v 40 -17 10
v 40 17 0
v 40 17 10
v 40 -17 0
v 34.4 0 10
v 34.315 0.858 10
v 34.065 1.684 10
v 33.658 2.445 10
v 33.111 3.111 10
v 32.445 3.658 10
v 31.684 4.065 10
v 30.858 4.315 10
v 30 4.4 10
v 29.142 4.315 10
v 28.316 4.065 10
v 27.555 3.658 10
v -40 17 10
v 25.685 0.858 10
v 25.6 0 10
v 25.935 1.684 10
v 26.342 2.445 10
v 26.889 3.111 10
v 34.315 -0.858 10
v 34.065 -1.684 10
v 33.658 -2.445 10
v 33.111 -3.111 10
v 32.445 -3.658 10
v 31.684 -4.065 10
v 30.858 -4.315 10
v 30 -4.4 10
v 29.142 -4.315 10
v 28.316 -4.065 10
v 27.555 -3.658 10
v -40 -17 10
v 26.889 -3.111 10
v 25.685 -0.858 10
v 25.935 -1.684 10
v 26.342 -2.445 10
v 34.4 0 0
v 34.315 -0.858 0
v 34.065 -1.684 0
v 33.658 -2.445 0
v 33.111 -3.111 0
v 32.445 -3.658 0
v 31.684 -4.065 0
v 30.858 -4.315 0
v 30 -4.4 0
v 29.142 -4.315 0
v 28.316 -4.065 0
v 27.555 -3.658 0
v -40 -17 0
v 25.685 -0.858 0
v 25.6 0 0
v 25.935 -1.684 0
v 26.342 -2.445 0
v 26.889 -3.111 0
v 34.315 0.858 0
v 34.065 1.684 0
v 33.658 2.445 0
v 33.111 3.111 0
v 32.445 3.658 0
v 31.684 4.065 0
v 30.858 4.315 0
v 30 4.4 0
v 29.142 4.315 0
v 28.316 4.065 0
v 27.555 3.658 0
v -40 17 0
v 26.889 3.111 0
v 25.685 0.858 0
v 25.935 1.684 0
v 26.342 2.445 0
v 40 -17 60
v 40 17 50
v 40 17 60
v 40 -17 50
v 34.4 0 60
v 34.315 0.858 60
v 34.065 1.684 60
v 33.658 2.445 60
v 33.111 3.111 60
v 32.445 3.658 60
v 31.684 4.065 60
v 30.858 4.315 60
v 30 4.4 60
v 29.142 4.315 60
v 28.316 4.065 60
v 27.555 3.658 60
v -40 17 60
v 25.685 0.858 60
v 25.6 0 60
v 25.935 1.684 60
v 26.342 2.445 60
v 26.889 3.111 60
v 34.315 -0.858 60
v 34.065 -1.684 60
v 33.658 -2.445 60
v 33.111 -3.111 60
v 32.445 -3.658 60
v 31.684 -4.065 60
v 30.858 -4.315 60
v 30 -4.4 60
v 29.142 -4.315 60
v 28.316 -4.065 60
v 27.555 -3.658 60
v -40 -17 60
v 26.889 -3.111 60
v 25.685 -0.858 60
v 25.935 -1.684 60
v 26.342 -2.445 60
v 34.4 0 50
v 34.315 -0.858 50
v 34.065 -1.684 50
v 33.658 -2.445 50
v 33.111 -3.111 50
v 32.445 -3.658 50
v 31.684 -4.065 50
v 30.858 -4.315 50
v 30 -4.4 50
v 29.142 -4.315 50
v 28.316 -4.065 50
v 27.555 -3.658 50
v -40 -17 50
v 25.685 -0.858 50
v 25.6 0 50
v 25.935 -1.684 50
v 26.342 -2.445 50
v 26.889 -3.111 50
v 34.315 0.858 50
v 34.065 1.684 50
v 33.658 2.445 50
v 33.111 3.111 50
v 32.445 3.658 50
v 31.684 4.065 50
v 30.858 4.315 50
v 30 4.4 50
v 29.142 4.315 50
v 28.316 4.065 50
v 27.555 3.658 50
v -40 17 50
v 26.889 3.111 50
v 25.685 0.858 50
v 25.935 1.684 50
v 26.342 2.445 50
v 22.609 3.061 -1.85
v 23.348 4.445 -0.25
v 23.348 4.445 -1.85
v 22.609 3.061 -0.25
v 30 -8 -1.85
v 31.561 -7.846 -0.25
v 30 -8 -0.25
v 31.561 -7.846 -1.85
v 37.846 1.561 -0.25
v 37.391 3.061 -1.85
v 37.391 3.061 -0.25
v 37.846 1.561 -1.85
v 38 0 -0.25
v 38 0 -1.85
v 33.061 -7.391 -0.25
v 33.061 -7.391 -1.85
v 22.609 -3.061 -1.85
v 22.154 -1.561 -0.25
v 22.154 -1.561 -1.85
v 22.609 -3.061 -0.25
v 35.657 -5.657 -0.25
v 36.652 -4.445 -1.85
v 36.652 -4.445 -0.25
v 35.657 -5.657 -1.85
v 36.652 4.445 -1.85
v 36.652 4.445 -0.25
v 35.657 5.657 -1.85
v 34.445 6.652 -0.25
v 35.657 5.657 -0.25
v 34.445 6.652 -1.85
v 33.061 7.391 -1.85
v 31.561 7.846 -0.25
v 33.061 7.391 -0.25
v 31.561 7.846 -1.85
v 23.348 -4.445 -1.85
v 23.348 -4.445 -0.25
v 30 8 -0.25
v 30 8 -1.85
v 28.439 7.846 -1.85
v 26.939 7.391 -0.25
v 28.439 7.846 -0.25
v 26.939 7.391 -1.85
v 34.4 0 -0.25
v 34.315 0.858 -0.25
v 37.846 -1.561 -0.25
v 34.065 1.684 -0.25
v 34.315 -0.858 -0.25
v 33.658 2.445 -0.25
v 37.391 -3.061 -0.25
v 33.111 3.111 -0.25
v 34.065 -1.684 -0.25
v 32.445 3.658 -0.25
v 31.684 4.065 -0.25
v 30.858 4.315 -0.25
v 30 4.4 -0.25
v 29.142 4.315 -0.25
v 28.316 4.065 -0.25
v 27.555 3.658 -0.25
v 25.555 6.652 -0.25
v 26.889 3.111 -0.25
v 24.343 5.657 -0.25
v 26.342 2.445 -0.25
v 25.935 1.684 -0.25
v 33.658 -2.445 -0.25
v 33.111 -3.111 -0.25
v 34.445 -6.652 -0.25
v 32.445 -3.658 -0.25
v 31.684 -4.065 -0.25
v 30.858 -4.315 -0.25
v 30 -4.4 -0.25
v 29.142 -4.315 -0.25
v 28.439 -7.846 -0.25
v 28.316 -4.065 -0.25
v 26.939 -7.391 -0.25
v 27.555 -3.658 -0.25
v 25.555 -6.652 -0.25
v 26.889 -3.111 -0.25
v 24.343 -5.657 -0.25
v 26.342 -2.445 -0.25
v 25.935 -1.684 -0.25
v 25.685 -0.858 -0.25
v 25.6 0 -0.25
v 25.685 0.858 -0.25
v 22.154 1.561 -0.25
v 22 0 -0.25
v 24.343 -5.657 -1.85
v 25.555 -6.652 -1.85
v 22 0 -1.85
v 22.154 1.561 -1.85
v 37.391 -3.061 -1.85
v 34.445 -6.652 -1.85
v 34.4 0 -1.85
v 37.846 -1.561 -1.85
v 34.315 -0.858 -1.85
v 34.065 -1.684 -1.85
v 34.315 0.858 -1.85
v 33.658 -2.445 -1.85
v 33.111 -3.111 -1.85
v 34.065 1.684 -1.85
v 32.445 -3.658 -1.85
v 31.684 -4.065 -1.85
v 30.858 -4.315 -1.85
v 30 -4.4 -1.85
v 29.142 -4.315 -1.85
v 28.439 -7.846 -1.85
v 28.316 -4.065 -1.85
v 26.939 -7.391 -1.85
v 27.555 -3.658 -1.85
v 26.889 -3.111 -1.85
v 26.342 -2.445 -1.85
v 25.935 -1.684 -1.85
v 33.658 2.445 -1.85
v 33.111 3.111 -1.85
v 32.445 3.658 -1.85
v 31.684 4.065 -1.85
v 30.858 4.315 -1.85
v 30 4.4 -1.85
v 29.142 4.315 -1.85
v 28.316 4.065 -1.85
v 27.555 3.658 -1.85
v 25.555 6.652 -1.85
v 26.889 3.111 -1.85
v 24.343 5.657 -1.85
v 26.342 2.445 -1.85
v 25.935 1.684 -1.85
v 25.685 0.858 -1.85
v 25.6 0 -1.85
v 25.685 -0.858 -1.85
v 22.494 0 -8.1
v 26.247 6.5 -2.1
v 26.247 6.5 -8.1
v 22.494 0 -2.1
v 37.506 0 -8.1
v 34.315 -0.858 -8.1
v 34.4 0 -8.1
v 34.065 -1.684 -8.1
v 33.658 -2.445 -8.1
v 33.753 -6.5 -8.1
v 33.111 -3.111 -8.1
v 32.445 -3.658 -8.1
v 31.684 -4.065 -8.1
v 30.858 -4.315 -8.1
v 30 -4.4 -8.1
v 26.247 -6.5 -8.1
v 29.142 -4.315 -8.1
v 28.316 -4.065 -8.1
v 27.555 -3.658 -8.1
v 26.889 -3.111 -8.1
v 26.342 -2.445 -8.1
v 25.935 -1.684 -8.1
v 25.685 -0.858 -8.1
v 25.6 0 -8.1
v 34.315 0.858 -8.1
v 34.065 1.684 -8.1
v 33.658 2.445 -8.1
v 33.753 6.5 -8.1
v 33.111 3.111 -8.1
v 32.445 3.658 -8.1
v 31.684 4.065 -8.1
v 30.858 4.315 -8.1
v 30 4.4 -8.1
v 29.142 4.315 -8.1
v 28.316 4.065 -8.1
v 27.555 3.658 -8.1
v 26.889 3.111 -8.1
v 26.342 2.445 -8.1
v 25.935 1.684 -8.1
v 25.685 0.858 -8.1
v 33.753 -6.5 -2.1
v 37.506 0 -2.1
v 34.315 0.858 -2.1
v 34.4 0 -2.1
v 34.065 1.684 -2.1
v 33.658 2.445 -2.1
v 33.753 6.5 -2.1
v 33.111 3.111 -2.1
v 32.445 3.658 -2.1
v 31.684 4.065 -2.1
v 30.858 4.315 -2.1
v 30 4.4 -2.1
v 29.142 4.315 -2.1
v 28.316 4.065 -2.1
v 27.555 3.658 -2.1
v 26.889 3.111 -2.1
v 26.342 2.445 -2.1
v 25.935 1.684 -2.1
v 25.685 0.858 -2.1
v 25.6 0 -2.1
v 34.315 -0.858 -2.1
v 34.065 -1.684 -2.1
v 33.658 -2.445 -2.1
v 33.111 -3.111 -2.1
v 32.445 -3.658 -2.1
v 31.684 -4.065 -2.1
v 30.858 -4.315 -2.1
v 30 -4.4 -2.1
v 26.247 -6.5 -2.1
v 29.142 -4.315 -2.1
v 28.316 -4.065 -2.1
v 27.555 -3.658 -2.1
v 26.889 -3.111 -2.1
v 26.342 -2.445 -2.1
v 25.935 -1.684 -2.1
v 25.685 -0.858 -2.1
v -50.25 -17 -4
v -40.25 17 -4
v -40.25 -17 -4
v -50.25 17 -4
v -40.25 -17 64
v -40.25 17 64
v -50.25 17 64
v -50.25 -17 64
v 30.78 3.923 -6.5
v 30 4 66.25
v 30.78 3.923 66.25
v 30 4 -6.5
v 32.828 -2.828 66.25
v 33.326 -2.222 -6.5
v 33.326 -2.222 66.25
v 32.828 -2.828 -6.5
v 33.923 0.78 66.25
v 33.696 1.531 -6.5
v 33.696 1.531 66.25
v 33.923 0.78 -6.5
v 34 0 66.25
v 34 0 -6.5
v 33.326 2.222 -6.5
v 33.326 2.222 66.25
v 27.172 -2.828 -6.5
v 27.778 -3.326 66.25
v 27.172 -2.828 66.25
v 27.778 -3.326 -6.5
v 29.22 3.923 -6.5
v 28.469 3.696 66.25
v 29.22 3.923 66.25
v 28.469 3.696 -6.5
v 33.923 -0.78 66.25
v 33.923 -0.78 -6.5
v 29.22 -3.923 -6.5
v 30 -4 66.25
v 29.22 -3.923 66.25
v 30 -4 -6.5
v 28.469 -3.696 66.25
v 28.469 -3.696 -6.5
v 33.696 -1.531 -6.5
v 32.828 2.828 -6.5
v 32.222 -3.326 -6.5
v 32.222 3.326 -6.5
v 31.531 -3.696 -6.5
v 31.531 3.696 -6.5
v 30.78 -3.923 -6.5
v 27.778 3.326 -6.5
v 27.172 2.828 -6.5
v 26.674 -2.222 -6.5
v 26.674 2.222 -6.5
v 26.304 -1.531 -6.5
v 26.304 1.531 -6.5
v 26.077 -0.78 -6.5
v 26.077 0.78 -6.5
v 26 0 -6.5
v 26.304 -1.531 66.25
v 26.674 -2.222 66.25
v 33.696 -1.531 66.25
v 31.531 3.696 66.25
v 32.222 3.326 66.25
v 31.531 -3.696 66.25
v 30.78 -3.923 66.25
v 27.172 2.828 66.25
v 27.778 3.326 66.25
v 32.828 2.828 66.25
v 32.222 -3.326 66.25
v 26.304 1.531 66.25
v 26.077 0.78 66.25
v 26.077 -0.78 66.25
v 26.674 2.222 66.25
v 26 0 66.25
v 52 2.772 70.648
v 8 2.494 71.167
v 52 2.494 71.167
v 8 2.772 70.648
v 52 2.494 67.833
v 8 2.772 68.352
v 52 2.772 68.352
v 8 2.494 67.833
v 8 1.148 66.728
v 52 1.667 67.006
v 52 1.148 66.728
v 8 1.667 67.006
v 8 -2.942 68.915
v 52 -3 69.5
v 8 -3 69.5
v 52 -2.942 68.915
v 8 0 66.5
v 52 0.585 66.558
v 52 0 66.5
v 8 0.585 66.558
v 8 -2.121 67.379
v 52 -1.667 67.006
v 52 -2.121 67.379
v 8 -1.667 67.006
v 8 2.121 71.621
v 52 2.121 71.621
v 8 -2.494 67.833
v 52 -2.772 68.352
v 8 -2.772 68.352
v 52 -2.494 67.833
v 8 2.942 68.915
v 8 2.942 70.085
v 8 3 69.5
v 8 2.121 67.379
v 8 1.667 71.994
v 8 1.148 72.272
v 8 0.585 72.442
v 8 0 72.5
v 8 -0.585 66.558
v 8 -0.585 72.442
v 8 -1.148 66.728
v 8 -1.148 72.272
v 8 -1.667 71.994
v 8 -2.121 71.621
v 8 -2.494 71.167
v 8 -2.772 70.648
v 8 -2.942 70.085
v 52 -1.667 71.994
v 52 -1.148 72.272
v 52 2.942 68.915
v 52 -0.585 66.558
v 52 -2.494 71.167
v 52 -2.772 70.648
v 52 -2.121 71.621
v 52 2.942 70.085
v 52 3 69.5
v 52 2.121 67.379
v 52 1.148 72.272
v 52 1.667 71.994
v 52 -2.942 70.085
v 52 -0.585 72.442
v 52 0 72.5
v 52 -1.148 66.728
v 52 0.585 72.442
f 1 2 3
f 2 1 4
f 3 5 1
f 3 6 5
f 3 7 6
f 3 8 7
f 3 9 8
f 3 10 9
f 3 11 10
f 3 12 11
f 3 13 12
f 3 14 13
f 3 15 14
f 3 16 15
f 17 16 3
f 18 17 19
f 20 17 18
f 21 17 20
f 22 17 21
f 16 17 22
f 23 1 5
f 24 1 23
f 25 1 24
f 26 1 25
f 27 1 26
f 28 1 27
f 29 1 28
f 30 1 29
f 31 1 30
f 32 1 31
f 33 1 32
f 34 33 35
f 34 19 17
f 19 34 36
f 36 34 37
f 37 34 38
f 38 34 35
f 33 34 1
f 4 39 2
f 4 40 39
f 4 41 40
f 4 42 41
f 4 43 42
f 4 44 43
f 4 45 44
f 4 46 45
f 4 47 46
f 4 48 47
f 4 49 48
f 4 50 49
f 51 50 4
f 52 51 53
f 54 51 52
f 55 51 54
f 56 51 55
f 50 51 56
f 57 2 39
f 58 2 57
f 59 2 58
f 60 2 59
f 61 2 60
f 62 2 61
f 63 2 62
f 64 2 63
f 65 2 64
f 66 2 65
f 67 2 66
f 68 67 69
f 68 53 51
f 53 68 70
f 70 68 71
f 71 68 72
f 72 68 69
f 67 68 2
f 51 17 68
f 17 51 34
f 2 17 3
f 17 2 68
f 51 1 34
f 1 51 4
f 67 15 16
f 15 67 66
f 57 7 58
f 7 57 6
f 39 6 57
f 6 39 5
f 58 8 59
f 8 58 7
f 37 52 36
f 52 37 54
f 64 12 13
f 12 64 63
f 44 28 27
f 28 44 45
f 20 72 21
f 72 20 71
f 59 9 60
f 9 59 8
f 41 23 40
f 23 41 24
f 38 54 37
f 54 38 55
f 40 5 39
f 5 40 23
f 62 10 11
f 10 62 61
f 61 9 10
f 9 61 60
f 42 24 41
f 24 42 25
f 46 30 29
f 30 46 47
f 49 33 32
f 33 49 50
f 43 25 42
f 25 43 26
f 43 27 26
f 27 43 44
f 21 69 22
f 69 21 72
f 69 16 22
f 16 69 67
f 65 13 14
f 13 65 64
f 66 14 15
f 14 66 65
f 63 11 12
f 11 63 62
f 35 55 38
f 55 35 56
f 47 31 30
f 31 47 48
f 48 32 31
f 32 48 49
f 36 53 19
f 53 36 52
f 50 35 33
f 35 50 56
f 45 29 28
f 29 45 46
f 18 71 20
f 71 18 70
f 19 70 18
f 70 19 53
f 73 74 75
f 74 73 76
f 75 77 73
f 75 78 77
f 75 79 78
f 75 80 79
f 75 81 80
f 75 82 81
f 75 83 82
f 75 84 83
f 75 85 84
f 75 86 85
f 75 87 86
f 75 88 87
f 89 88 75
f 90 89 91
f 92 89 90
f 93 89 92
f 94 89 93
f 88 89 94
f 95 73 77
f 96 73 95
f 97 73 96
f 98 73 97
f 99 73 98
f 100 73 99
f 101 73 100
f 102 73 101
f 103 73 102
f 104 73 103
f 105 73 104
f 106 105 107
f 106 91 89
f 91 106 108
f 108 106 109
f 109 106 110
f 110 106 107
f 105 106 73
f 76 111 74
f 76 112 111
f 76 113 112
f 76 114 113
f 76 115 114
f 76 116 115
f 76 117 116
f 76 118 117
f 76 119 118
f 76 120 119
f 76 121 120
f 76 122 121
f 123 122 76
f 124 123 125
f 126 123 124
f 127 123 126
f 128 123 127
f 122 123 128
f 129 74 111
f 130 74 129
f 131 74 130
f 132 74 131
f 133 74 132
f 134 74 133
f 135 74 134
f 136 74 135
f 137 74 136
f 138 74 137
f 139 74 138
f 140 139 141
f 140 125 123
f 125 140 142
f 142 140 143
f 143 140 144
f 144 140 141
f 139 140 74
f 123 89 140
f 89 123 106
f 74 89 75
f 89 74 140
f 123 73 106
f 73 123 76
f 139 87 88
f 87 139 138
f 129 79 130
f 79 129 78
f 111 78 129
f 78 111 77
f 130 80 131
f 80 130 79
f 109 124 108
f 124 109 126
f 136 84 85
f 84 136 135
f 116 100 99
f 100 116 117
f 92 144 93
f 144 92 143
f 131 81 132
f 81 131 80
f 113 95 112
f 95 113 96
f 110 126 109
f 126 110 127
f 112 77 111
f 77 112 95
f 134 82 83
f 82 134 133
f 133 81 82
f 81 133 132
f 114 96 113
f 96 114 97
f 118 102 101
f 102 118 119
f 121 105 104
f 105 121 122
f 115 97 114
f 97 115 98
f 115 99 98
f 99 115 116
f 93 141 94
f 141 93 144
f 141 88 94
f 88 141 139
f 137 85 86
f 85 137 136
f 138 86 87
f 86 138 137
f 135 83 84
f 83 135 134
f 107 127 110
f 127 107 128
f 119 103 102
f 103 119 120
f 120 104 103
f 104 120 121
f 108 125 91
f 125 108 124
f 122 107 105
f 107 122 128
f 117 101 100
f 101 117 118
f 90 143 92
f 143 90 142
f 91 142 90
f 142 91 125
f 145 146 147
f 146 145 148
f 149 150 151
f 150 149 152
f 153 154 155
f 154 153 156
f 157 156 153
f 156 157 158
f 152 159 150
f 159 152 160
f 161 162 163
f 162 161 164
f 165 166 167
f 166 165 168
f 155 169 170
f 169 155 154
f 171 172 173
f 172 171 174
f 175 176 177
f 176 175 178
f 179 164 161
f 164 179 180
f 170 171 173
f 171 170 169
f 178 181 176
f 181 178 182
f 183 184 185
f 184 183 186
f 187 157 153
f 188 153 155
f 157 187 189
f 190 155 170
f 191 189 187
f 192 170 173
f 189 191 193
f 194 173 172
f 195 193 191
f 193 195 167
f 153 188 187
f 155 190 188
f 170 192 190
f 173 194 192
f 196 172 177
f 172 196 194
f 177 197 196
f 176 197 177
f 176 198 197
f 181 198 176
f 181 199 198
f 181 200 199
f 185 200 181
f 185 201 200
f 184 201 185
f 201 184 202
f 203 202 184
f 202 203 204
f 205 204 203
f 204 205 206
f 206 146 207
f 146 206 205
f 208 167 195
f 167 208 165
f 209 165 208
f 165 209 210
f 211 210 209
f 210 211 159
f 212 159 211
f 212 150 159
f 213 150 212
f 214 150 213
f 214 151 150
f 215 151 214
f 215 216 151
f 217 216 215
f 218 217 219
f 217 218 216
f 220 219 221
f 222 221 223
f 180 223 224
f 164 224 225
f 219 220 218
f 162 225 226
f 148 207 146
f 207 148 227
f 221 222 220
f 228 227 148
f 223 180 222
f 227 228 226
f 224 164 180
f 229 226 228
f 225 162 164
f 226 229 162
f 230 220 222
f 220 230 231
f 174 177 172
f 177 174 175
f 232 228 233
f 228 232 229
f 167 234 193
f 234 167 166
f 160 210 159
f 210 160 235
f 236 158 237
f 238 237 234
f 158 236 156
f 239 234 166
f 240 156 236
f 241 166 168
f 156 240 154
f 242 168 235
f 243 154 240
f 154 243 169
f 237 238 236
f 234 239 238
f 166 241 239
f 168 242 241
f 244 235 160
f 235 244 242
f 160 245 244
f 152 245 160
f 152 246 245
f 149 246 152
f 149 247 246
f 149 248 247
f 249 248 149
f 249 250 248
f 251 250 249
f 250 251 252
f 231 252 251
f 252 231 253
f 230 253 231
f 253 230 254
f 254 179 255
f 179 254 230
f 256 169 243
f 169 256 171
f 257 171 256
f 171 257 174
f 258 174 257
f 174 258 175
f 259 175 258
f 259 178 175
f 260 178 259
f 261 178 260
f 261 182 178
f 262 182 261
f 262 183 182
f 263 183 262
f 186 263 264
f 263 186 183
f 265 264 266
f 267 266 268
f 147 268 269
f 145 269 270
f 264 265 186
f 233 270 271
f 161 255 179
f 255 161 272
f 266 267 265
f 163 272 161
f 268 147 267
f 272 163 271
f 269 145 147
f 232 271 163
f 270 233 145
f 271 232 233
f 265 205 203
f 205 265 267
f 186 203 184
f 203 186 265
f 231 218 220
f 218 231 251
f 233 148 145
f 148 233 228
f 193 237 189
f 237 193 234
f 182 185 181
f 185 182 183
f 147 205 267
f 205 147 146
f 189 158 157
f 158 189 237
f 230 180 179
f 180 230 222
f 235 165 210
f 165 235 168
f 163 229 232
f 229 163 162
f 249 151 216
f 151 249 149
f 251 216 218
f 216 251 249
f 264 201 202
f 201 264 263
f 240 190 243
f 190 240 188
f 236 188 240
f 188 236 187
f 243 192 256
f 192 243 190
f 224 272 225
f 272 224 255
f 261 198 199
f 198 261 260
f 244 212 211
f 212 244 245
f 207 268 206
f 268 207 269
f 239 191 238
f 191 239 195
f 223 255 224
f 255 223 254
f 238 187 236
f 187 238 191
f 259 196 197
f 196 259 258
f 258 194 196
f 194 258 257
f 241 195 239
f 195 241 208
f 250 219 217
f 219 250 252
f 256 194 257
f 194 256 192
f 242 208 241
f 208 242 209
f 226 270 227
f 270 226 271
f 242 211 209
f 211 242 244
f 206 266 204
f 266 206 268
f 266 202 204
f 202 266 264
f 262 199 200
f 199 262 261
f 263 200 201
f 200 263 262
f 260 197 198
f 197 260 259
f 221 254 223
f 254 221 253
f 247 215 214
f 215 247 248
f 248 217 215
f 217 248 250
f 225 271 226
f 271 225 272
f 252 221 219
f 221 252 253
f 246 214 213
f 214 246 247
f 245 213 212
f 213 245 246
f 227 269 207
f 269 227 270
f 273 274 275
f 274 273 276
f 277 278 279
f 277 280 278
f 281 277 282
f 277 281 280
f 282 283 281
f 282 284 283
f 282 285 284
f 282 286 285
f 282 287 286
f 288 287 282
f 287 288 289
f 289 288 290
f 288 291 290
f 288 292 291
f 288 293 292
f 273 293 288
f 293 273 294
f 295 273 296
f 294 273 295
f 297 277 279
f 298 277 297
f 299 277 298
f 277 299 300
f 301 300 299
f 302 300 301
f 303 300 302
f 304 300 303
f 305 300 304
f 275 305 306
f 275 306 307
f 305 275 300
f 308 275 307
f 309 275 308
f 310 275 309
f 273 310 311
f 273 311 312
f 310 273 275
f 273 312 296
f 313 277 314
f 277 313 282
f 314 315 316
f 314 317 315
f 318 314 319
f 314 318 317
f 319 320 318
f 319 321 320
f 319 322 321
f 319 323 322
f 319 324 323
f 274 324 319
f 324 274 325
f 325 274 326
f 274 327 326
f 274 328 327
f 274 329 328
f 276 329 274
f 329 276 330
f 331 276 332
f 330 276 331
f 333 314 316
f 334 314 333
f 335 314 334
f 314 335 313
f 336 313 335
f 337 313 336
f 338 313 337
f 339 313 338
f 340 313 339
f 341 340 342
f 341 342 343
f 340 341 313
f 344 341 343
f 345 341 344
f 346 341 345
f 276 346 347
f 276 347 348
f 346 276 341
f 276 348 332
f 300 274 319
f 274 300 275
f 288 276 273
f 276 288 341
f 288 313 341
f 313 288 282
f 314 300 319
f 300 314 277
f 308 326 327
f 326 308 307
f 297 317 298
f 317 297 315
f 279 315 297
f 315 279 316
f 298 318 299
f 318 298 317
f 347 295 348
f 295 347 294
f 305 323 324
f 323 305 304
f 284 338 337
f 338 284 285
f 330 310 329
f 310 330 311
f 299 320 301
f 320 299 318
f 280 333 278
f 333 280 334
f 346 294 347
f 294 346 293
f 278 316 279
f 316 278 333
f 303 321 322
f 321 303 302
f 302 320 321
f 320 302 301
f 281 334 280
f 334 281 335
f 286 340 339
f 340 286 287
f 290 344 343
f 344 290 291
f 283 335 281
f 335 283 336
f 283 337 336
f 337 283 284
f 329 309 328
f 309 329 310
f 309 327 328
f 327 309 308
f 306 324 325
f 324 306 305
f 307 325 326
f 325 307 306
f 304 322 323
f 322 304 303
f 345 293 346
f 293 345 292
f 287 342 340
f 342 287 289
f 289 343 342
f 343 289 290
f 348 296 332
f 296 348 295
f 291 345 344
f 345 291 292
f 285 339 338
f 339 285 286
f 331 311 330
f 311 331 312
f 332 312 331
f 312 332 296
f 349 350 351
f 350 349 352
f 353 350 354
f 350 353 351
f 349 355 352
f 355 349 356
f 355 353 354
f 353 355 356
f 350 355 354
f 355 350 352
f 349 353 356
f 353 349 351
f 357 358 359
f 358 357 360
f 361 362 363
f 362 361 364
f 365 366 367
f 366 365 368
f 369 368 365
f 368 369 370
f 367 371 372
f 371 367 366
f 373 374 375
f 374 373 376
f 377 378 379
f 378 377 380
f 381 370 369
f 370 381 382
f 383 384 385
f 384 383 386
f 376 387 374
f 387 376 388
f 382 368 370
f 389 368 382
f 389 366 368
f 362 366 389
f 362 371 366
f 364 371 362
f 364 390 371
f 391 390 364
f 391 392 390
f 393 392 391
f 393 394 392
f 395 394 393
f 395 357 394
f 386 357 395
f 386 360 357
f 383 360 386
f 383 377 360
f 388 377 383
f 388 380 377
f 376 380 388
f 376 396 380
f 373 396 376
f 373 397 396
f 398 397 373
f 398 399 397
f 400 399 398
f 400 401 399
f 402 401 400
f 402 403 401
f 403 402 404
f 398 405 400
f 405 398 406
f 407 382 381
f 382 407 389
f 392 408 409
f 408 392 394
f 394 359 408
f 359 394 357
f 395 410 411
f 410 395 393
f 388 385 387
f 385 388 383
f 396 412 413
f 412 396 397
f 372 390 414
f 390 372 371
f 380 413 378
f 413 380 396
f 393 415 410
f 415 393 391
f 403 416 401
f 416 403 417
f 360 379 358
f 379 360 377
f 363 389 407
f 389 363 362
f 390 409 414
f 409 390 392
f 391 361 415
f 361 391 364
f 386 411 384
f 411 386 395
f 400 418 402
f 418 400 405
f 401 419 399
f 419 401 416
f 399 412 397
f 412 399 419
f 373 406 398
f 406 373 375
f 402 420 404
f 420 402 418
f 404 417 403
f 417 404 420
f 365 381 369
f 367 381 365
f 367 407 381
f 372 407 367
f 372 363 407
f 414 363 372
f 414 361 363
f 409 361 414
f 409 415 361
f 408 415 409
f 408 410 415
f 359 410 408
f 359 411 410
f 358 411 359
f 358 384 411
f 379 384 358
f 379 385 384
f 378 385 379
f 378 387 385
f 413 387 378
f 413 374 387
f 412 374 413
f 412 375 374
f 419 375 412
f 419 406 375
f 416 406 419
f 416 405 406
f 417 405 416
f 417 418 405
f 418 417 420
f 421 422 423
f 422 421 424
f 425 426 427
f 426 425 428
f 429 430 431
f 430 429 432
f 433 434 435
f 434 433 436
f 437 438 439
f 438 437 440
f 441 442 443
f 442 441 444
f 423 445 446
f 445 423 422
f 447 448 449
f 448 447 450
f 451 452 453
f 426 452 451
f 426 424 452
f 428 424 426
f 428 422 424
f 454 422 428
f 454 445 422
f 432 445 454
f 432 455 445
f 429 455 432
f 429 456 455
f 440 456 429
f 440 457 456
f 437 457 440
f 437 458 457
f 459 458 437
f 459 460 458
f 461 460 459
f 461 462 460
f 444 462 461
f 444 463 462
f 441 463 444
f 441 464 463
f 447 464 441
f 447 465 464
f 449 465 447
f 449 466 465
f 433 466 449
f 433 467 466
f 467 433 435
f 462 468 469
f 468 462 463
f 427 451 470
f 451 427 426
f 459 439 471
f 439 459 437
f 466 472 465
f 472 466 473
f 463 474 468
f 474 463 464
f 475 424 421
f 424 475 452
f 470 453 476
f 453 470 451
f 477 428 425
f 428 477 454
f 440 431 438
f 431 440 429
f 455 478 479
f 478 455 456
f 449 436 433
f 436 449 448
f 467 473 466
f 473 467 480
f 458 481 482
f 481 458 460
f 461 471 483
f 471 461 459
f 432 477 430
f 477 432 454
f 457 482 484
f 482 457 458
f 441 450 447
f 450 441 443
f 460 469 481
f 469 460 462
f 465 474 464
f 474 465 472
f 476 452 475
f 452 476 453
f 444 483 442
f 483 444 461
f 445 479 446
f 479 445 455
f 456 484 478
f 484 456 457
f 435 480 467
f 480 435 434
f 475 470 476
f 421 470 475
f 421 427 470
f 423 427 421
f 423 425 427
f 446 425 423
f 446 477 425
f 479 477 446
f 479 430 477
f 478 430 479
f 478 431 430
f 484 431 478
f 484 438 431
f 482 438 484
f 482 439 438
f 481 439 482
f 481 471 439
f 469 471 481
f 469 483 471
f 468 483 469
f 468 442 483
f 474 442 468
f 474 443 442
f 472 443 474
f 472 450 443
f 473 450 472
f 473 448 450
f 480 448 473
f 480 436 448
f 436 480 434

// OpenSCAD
$fn = 32;

// ------------------------------------------------------------------------
// C clamp: throat 50 mm, screw d8
// Every part is its own module, assembly() places every instance.
// ------------------------------------------------------------------------

// --- part 1 ---
module clamp_arm() {
  difference() {
    translate([-40, -17, 0]) cube([80, 34, 10]);
    translate([30, 0, -1]) cylinder(h = 12, d = 8.8);
  }
}

// --- part 2 ---
module clamp_spine() {
  difference() {
    translate([-34, -17, 0]) cube([68, 34, 10]);
  }
}

// --- part 3 ---
module clamp_screw() {
  translate([0, 0, -36.375]) cylinder(h = 72.75, d = 8);
}

// --- part 4 ---
module clamp_washer() {
  difference() {
      translate([0, 0, 0]) cylinder(h = 1.6, d = 16);
      translate([0, 0, -1]) cylinder(h = 3.6, d = 8.8);
    }
}

// --- part 5 ---
module clamp_nut() {
  difference() {
    linear_extrude(height = 6) polygon(points = [[7.506, 0], [3.753, 6.5], [-3.753, 6.5], [-7.506, 0], [-3.753, -6.5], [3.753, -6.5]]);
    translate([0, 0, -1]) cylinder(h = 8, d = 8.8);
  }
}

// --- part 6 ---
module tommy_bar() {
  translate([0, 0, -22]) cylinder(h = 44, d = 6);
}

// --- assembly ---
module assembly() {
  color([0.80, 0.24, 0.20]) translate([0, 0, 0]) rotate([0, 0, 0]) clamp_arm();
  color([0.20, 0.45, 0.75]) translate([0, 0, 50]) rotate([0, 0, 0]) clamp_arm();
  color([0.25, 0.62, 0.32]) translate([-50.25, 0, 30]) rotate([0, 90, 0]) clamp_spine();
  color([0.92, 0.70, 0.18]) translate([30, 0, 29.875]) rotate([0, 0, 0]) clamp_screw();
  color([0.58, 0.35, 0.70]) translate([30, 0, -1.85]) rotate([0, 0, 0]) clamp_washer();
  color([0.16, 0.66, 0.66]) translate([30, 0, -8.1]) rotate([0, 0, 0]) clamp_nut();
  color([0.85, 0.48, 0.18]) translate([30, 0, 69.5]) rotate([0, 90, 0]) tommy_bar();
}

assembly();
